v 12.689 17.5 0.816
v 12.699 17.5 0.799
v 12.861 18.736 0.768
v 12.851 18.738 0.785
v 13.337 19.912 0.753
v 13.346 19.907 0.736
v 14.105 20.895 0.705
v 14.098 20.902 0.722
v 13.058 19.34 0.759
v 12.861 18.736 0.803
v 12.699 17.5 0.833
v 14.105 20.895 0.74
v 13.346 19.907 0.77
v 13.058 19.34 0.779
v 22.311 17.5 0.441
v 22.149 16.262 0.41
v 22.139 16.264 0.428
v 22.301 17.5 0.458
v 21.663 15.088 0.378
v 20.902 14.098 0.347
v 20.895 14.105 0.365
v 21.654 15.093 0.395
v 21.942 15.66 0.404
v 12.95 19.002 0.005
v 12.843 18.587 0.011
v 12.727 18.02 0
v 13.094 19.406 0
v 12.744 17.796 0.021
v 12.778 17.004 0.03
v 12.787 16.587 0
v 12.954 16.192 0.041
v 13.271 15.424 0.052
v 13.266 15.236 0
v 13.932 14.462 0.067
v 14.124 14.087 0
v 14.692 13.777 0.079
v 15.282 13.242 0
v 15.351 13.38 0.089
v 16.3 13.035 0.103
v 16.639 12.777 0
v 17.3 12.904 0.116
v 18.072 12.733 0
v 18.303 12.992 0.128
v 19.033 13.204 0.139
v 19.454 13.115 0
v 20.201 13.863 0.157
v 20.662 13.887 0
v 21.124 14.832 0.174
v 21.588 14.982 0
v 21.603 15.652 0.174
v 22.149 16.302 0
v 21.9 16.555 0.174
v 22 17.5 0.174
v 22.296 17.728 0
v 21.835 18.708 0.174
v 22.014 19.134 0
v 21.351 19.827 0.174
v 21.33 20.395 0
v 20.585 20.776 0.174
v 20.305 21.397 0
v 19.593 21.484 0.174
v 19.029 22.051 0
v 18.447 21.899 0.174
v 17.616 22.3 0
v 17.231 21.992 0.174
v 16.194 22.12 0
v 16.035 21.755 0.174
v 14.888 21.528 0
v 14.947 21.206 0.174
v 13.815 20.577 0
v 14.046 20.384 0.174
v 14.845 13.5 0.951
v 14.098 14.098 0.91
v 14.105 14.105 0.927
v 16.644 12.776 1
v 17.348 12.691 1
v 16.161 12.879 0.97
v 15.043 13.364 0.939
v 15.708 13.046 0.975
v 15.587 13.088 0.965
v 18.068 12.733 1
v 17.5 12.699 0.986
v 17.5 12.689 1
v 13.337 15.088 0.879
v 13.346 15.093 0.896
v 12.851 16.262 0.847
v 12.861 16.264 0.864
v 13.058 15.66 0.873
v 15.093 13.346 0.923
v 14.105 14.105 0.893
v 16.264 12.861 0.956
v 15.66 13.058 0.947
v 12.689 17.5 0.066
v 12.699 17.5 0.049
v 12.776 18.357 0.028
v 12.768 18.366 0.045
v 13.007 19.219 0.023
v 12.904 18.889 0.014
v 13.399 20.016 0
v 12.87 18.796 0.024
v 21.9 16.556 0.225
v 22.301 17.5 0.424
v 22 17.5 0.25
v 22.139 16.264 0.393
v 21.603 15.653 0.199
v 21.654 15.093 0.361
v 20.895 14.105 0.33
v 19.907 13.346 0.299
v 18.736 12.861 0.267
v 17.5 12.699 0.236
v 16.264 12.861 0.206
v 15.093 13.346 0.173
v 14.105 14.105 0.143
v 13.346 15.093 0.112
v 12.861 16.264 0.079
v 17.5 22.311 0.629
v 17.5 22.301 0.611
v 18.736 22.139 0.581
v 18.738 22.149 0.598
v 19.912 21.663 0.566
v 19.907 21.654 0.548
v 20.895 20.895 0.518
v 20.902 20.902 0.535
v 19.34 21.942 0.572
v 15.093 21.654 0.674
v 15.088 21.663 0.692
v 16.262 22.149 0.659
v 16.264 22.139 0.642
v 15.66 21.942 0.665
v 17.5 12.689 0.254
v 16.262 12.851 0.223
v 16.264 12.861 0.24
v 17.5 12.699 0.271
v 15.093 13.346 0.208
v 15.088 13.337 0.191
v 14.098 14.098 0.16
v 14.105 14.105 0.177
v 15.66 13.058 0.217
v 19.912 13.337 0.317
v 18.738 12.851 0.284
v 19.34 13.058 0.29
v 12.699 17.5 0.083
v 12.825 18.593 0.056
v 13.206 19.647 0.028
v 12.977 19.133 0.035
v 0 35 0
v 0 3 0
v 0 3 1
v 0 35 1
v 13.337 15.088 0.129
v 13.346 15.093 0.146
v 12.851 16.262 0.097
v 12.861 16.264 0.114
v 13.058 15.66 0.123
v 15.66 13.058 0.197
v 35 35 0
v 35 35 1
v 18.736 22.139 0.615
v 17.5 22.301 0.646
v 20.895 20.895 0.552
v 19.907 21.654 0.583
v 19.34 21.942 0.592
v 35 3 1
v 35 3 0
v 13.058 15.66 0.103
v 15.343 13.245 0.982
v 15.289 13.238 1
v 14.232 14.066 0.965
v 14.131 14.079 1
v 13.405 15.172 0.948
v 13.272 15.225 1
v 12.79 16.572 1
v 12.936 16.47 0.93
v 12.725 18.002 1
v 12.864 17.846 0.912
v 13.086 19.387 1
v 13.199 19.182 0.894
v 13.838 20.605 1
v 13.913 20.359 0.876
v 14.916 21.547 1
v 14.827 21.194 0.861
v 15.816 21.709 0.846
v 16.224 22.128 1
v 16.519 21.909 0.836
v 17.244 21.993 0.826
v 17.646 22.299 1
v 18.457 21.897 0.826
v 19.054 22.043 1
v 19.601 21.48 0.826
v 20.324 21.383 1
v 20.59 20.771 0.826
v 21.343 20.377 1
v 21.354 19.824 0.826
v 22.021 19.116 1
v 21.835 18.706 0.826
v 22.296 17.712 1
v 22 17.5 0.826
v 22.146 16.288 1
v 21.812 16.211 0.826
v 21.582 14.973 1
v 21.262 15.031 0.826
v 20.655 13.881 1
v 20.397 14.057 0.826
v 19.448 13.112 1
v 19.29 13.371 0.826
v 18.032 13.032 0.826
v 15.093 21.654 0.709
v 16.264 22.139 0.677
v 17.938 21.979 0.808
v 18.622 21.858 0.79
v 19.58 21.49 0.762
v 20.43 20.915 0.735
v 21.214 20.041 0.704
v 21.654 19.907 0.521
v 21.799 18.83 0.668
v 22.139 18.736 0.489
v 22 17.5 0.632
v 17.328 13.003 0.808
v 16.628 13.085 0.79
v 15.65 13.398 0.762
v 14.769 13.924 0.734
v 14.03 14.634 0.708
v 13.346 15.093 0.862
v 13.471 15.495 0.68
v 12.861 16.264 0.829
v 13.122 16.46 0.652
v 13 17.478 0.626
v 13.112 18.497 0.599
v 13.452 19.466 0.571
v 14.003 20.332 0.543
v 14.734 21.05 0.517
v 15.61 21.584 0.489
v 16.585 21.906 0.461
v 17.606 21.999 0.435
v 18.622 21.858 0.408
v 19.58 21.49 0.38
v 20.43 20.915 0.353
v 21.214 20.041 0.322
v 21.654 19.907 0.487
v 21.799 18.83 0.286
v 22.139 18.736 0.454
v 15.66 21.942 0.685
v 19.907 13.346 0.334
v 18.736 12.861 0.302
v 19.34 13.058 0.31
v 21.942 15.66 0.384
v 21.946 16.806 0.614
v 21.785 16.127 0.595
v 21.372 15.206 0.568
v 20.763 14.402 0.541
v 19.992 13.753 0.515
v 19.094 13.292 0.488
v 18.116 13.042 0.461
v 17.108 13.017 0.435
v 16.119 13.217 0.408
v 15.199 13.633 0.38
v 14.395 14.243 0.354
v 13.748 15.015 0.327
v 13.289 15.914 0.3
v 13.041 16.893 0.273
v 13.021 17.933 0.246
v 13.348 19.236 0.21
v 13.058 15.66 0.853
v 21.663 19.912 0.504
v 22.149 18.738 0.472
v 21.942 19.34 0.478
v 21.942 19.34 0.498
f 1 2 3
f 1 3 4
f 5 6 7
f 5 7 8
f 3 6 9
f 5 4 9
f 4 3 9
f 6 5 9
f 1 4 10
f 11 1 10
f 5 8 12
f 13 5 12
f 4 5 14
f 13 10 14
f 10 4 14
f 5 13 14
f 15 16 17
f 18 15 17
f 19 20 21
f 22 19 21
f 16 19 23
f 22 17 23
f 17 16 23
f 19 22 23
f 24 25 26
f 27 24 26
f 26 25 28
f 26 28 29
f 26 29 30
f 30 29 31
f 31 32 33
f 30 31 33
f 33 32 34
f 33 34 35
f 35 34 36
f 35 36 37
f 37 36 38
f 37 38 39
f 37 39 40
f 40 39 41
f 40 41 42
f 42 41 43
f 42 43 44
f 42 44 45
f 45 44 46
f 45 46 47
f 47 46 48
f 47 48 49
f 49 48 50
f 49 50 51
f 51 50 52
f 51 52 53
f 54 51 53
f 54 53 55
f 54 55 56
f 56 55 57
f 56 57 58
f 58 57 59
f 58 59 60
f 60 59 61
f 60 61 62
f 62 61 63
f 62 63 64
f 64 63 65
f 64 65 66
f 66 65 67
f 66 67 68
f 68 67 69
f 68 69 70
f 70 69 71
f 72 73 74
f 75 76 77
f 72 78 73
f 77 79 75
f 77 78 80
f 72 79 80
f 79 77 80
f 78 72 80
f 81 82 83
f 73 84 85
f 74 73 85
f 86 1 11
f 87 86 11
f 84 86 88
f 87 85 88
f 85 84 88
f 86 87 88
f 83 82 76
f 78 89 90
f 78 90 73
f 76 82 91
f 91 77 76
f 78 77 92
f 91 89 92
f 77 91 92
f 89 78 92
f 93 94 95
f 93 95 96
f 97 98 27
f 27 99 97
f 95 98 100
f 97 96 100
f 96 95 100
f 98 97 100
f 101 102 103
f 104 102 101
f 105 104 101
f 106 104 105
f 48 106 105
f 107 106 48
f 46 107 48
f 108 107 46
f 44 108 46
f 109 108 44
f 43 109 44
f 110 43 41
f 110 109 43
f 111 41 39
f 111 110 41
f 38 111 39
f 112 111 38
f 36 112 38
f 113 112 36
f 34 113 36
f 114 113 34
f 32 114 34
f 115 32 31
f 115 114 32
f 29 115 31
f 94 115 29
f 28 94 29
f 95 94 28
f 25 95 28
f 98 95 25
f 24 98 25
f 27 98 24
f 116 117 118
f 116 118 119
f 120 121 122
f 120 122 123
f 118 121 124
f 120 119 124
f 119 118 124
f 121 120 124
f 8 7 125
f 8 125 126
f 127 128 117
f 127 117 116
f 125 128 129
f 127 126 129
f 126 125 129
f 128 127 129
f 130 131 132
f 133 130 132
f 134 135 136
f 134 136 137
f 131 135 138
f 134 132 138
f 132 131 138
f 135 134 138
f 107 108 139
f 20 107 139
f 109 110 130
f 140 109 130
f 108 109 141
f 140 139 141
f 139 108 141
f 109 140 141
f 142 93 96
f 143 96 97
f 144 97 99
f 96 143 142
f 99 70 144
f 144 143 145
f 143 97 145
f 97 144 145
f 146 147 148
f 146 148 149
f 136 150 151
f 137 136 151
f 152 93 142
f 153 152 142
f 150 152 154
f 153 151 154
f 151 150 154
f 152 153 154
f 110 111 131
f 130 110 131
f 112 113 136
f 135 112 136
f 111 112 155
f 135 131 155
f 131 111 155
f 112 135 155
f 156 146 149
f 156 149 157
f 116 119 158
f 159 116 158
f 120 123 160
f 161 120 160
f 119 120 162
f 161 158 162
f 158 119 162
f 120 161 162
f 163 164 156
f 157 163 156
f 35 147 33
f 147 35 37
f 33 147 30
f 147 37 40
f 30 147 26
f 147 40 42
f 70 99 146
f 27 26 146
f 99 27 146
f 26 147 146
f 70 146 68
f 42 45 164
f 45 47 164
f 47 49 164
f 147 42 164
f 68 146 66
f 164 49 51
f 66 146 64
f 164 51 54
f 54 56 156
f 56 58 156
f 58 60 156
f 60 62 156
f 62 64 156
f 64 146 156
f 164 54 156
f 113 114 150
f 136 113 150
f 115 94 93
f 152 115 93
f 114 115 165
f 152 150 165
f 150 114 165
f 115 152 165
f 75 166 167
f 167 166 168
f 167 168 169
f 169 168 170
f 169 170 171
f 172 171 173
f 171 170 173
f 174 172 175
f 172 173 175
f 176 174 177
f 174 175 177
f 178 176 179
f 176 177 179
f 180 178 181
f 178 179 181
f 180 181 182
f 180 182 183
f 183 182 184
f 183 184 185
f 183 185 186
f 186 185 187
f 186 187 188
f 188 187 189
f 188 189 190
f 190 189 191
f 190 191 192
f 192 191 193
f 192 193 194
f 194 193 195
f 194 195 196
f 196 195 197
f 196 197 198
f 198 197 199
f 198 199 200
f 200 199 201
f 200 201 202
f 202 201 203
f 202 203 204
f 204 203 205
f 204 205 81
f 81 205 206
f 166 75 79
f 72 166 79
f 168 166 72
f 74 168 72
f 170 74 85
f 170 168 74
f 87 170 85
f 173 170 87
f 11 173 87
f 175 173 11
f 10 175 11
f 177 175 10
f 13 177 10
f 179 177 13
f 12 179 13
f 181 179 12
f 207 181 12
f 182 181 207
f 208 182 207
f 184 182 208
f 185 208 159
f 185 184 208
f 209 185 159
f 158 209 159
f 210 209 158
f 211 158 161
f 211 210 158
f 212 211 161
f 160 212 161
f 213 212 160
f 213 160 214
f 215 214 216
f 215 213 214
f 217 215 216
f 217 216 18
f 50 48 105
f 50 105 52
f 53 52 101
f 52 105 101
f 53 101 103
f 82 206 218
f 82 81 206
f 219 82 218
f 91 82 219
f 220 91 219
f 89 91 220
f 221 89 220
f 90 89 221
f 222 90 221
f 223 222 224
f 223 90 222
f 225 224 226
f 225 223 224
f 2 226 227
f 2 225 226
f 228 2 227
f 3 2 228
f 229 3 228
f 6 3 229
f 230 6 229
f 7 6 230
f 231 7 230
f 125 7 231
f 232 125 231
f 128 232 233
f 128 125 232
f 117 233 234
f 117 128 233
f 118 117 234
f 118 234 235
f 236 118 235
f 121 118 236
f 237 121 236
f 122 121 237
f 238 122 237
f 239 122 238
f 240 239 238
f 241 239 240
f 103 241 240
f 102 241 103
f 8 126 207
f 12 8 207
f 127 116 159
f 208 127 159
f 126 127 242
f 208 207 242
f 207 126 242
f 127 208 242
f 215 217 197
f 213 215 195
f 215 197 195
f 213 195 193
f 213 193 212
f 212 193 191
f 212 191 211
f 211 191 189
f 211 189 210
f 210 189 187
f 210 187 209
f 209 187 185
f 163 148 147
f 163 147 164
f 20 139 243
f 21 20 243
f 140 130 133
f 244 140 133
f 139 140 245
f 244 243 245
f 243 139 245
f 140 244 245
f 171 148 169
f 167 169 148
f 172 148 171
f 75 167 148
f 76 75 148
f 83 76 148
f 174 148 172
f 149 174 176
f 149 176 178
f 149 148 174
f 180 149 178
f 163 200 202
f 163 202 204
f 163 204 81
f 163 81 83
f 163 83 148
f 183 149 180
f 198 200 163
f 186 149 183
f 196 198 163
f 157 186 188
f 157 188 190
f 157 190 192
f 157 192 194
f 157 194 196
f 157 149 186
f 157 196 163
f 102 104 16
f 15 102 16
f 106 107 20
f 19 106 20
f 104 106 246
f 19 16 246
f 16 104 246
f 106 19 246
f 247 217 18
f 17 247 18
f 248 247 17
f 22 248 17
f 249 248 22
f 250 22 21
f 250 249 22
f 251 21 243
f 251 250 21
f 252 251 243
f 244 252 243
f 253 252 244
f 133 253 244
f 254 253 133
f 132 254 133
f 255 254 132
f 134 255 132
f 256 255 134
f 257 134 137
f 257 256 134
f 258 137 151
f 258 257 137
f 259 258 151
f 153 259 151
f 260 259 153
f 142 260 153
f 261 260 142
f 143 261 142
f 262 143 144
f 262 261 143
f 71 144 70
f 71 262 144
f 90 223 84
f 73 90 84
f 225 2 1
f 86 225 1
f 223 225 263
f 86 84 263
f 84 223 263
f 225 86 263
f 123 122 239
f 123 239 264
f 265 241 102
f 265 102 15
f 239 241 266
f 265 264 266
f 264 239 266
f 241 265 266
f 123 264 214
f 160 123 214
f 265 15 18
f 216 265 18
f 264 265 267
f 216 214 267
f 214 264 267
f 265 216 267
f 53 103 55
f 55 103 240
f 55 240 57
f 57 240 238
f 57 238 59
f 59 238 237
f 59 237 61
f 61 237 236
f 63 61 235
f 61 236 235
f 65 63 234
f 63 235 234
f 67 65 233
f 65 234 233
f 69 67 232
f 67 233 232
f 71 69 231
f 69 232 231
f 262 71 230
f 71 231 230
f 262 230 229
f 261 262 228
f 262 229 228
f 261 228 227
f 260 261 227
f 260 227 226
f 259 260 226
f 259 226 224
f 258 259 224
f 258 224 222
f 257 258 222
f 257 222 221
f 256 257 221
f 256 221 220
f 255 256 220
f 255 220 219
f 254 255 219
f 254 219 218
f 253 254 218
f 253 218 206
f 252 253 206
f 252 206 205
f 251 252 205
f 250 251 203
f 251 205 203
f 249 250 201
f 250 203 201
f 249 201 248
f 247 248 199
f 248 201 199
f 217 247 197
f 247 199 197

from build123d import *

# Parameters (mm, degrees)
SKETCH1_W           = 35
SKETCH1_H           = 35
BOSS_EXTRUDE1_DEPTH = 1
CUT_EXTRUDE1_REACH  = 51.508
SKETCH2_R           = 4.5
CUT_SWEEP9_PITCH    = 0.75
SKETCH26_W          = 35
SKETCH26_H          = 1
CUT_EXTRUDE4_DEPTH  = 3


with BuildPart() as part:
    # Sketch1 → Boss-Extrude1 (new body)
    with BuildSketch(Plane.XY):
        with Locations((17.5, 17.5)):
            Rectangle(SKETCH1_W, SKETCH1_H)
    extrude(amount=BOSS_EXTRUDE1_DEPTH)

    # Sketch2 → Cut-Extrude1 (cut, up to next)
    with BuildSketch(Plane.XY.offset(1), mode=Mode.PRIVATE) as cut_extrude1_sk1:
        with Locations((17.5, 17.5)):
            Circle(SKETCH2_R)
    cut_extrude1_tool1 = extrude(cut_extrude1_sk1.sketch, amount=-CUT_EXTRUDE1_REACH, mode=Mode.PRIVATE) & part.part
    add(cut_extrude1_tool1.solids().sort_by_distance((17.5, 17.5, 1))[0], mode=Mode.SUBTRACT)

    # Cut-Sweep9: the profile of Sketch22 profile screwed along a right-hand helix of 3 turns, 8 arcs to a turn; built about Z, then put on its axis
    cut_sweep9_z = Axis((0, 0, 0), (0, 0, 1))
    cut_sweep9_corners = [(4.4997, 0, -0.382379083), (4.4997, 0, 0.000173205), (4.801, 0, -0.173782431), (4.811, 0, -0.191102939), (4.801, 0, -0.208423447)]
    with BuildLine(mode=Mode.PRIVATE) as cut_sweep9_profile:
        Line(cut_sweep9_corners[0], cut_sweep9_corners[1])
        Line(cut_sweep9_corners[1], cut_sweep9_corners[2])
        Line(cut_sweep9_corners[4], cut_sweep9_corners[0])
        ThreePointArc((4.801, 0, -0.173782431), (4.808320508, 0, -0.181102939), (4.811, 0, -0.191102939))
        ThreePointArc((4.811, 0, -0.191102939), (4.808320508, 0, -0.201102939), (4.801, 0, -0.208423447))
    cut_sweep9_cap = Face(cut_sweep9_profile.wire())
    cut_sweep9_arcs = [((4.801, 0, -0.173782431), (4.811, 0, -0.179555934), (4.811, 0, -0.191102939), (1, 0.866025403784374, 1)), ((4.811, 0, -0.191102939), (4.811, 0, -0.202649944), (4.801, 0, -0.208423447), (1, 0.866025403784374, 1))]  # start, shoulder, end, weights
    cut_sweep9_turn_angles = [0, 22.5, 45, 67.5, 90, 112.5, 135, 157.5, 180, 202.5, 225, 247.5, 270, 292.5, 315, 337.5, 360]
    cut_sweep9_turn_weights = [1, 0.9238795325112867, 1, 0.9238795325112867, 1, 0.9238795325112867, 1, 0.9238795325112867, 1, 0.9238795325112867, 1, 0.9238795325112867, 1, 0.9238795325112867, 1, 0.9238795325112867, 1]
    cut_sweep9_turn_rails = [Edge.make_bspline([Vector(p[0], p[1], 0).rotate(cut_sweep9_z, cut_sweep9_turn_angles[k]) / cut_sweep9_turn_weights[k] + Vector(0, 0, p[2] + CUT_SWEEP9_PITCH * cut_sweep9_turn_angles[k] / 360) for k in range(17)], [0, 0, 0, 1, 1, 2, 2, 3, 3, 4, 4, 5, 5, 6, 6, 7, 7, 8, 8, 8], 2, cut_sweep9_turn_weights) for p in cut_sweep9_corners]
    cut_sweep9_turn_sides = [*[Face.make_surface_from_curves(cut_sweep9_turn_rails[p[0]], cut_sweep9_turn_rails[p[1]]) for p in [(0, 1), (1, 2), (4, 0)]], *[Face.make_bezier_surface([[Vector(p[j][0], p[j][1], 0).rotate(cut_sweep9_z, cut_sweep9_turn_angles[2 * i + k]) / cut_sweep9_turn_weights[2 * i + k] + Vector(0, 0, p[j][2] + CUT_SWEEP9_PITCH * cut_sweep9_turn_angles[2 * i + k] / 360) for k in range(3)] for j in range(3)], [[p[3][j] * cut_sweep9_turn_weights[2 * i + k] for k in range(3)] for j in range(3)]) for p in cut_sweep9_arcs for i in range(8)]]
    cut_sweep9 = Plane(origin=(17.5, 17.5, 1), x_dir=(1, 0, 0), z_dir=(0, 0, -1)) * Solid(Shell([*[p.moved(Location((0, 0, CUT_SWEEP9_PITCH * i))) for i in range(3) for p in cut_sweep9_turn_sides], cut_sweep9_cap, cut_sweep9_cap.rotate(cut_sweep9_z, 1080).moved(Location((0, 0, CUT_SWEEP9_PITCH * 1080 / 360)))]))
    add(cut_sweep9, mode=Mode.SUBTRACT)

    # Cut-Extrude2 cone 1 section (through the dimple's axis) → Cut-Extrude2 (revolve, cut)
    with BuildSketch(Plane(origin=(17.5, 17.5, 1), x_dir=(0, -1, 0), z_dir=(1, 0, 0))):
        Polygon((0, 0), (4.801, 0), (0, 2.771858642), align=None)
    revolve(axis=Axis((17.5, 17.5, 1), (0, 0, -1)), mode=Mode.SUBTRACT)

    # Cut-Extrude3 cone 1 section (through the dimple's axis) → Cut-Extrude3 (revolve, cut)
    with BuildSketch(Plane(origin=(17.5, 17.5, 0), x_dir=(0, 1, 0), z_dir=(1, 0, 0))):
        Polygon((0, 0), (4.801, 0), (0, 2.771858642), align=None)
    revolve(axis=Axis((17.5, 17.5, 0), (0, 0, 1)), mode=Mode.SUBTRACT)

    # Sketch26 → Cut-Extrude4 (cut)
    with BuildSketch(Plane.XZ):
        with Locations((17.5, 0.5)):
            Rectangle(SKETCH26_W, SKETCH26_H)
    extrude(amount=-CUT_EXTRUDE4_DEPTH, mode=Mode.SUBTRACT)


solid = part.part
